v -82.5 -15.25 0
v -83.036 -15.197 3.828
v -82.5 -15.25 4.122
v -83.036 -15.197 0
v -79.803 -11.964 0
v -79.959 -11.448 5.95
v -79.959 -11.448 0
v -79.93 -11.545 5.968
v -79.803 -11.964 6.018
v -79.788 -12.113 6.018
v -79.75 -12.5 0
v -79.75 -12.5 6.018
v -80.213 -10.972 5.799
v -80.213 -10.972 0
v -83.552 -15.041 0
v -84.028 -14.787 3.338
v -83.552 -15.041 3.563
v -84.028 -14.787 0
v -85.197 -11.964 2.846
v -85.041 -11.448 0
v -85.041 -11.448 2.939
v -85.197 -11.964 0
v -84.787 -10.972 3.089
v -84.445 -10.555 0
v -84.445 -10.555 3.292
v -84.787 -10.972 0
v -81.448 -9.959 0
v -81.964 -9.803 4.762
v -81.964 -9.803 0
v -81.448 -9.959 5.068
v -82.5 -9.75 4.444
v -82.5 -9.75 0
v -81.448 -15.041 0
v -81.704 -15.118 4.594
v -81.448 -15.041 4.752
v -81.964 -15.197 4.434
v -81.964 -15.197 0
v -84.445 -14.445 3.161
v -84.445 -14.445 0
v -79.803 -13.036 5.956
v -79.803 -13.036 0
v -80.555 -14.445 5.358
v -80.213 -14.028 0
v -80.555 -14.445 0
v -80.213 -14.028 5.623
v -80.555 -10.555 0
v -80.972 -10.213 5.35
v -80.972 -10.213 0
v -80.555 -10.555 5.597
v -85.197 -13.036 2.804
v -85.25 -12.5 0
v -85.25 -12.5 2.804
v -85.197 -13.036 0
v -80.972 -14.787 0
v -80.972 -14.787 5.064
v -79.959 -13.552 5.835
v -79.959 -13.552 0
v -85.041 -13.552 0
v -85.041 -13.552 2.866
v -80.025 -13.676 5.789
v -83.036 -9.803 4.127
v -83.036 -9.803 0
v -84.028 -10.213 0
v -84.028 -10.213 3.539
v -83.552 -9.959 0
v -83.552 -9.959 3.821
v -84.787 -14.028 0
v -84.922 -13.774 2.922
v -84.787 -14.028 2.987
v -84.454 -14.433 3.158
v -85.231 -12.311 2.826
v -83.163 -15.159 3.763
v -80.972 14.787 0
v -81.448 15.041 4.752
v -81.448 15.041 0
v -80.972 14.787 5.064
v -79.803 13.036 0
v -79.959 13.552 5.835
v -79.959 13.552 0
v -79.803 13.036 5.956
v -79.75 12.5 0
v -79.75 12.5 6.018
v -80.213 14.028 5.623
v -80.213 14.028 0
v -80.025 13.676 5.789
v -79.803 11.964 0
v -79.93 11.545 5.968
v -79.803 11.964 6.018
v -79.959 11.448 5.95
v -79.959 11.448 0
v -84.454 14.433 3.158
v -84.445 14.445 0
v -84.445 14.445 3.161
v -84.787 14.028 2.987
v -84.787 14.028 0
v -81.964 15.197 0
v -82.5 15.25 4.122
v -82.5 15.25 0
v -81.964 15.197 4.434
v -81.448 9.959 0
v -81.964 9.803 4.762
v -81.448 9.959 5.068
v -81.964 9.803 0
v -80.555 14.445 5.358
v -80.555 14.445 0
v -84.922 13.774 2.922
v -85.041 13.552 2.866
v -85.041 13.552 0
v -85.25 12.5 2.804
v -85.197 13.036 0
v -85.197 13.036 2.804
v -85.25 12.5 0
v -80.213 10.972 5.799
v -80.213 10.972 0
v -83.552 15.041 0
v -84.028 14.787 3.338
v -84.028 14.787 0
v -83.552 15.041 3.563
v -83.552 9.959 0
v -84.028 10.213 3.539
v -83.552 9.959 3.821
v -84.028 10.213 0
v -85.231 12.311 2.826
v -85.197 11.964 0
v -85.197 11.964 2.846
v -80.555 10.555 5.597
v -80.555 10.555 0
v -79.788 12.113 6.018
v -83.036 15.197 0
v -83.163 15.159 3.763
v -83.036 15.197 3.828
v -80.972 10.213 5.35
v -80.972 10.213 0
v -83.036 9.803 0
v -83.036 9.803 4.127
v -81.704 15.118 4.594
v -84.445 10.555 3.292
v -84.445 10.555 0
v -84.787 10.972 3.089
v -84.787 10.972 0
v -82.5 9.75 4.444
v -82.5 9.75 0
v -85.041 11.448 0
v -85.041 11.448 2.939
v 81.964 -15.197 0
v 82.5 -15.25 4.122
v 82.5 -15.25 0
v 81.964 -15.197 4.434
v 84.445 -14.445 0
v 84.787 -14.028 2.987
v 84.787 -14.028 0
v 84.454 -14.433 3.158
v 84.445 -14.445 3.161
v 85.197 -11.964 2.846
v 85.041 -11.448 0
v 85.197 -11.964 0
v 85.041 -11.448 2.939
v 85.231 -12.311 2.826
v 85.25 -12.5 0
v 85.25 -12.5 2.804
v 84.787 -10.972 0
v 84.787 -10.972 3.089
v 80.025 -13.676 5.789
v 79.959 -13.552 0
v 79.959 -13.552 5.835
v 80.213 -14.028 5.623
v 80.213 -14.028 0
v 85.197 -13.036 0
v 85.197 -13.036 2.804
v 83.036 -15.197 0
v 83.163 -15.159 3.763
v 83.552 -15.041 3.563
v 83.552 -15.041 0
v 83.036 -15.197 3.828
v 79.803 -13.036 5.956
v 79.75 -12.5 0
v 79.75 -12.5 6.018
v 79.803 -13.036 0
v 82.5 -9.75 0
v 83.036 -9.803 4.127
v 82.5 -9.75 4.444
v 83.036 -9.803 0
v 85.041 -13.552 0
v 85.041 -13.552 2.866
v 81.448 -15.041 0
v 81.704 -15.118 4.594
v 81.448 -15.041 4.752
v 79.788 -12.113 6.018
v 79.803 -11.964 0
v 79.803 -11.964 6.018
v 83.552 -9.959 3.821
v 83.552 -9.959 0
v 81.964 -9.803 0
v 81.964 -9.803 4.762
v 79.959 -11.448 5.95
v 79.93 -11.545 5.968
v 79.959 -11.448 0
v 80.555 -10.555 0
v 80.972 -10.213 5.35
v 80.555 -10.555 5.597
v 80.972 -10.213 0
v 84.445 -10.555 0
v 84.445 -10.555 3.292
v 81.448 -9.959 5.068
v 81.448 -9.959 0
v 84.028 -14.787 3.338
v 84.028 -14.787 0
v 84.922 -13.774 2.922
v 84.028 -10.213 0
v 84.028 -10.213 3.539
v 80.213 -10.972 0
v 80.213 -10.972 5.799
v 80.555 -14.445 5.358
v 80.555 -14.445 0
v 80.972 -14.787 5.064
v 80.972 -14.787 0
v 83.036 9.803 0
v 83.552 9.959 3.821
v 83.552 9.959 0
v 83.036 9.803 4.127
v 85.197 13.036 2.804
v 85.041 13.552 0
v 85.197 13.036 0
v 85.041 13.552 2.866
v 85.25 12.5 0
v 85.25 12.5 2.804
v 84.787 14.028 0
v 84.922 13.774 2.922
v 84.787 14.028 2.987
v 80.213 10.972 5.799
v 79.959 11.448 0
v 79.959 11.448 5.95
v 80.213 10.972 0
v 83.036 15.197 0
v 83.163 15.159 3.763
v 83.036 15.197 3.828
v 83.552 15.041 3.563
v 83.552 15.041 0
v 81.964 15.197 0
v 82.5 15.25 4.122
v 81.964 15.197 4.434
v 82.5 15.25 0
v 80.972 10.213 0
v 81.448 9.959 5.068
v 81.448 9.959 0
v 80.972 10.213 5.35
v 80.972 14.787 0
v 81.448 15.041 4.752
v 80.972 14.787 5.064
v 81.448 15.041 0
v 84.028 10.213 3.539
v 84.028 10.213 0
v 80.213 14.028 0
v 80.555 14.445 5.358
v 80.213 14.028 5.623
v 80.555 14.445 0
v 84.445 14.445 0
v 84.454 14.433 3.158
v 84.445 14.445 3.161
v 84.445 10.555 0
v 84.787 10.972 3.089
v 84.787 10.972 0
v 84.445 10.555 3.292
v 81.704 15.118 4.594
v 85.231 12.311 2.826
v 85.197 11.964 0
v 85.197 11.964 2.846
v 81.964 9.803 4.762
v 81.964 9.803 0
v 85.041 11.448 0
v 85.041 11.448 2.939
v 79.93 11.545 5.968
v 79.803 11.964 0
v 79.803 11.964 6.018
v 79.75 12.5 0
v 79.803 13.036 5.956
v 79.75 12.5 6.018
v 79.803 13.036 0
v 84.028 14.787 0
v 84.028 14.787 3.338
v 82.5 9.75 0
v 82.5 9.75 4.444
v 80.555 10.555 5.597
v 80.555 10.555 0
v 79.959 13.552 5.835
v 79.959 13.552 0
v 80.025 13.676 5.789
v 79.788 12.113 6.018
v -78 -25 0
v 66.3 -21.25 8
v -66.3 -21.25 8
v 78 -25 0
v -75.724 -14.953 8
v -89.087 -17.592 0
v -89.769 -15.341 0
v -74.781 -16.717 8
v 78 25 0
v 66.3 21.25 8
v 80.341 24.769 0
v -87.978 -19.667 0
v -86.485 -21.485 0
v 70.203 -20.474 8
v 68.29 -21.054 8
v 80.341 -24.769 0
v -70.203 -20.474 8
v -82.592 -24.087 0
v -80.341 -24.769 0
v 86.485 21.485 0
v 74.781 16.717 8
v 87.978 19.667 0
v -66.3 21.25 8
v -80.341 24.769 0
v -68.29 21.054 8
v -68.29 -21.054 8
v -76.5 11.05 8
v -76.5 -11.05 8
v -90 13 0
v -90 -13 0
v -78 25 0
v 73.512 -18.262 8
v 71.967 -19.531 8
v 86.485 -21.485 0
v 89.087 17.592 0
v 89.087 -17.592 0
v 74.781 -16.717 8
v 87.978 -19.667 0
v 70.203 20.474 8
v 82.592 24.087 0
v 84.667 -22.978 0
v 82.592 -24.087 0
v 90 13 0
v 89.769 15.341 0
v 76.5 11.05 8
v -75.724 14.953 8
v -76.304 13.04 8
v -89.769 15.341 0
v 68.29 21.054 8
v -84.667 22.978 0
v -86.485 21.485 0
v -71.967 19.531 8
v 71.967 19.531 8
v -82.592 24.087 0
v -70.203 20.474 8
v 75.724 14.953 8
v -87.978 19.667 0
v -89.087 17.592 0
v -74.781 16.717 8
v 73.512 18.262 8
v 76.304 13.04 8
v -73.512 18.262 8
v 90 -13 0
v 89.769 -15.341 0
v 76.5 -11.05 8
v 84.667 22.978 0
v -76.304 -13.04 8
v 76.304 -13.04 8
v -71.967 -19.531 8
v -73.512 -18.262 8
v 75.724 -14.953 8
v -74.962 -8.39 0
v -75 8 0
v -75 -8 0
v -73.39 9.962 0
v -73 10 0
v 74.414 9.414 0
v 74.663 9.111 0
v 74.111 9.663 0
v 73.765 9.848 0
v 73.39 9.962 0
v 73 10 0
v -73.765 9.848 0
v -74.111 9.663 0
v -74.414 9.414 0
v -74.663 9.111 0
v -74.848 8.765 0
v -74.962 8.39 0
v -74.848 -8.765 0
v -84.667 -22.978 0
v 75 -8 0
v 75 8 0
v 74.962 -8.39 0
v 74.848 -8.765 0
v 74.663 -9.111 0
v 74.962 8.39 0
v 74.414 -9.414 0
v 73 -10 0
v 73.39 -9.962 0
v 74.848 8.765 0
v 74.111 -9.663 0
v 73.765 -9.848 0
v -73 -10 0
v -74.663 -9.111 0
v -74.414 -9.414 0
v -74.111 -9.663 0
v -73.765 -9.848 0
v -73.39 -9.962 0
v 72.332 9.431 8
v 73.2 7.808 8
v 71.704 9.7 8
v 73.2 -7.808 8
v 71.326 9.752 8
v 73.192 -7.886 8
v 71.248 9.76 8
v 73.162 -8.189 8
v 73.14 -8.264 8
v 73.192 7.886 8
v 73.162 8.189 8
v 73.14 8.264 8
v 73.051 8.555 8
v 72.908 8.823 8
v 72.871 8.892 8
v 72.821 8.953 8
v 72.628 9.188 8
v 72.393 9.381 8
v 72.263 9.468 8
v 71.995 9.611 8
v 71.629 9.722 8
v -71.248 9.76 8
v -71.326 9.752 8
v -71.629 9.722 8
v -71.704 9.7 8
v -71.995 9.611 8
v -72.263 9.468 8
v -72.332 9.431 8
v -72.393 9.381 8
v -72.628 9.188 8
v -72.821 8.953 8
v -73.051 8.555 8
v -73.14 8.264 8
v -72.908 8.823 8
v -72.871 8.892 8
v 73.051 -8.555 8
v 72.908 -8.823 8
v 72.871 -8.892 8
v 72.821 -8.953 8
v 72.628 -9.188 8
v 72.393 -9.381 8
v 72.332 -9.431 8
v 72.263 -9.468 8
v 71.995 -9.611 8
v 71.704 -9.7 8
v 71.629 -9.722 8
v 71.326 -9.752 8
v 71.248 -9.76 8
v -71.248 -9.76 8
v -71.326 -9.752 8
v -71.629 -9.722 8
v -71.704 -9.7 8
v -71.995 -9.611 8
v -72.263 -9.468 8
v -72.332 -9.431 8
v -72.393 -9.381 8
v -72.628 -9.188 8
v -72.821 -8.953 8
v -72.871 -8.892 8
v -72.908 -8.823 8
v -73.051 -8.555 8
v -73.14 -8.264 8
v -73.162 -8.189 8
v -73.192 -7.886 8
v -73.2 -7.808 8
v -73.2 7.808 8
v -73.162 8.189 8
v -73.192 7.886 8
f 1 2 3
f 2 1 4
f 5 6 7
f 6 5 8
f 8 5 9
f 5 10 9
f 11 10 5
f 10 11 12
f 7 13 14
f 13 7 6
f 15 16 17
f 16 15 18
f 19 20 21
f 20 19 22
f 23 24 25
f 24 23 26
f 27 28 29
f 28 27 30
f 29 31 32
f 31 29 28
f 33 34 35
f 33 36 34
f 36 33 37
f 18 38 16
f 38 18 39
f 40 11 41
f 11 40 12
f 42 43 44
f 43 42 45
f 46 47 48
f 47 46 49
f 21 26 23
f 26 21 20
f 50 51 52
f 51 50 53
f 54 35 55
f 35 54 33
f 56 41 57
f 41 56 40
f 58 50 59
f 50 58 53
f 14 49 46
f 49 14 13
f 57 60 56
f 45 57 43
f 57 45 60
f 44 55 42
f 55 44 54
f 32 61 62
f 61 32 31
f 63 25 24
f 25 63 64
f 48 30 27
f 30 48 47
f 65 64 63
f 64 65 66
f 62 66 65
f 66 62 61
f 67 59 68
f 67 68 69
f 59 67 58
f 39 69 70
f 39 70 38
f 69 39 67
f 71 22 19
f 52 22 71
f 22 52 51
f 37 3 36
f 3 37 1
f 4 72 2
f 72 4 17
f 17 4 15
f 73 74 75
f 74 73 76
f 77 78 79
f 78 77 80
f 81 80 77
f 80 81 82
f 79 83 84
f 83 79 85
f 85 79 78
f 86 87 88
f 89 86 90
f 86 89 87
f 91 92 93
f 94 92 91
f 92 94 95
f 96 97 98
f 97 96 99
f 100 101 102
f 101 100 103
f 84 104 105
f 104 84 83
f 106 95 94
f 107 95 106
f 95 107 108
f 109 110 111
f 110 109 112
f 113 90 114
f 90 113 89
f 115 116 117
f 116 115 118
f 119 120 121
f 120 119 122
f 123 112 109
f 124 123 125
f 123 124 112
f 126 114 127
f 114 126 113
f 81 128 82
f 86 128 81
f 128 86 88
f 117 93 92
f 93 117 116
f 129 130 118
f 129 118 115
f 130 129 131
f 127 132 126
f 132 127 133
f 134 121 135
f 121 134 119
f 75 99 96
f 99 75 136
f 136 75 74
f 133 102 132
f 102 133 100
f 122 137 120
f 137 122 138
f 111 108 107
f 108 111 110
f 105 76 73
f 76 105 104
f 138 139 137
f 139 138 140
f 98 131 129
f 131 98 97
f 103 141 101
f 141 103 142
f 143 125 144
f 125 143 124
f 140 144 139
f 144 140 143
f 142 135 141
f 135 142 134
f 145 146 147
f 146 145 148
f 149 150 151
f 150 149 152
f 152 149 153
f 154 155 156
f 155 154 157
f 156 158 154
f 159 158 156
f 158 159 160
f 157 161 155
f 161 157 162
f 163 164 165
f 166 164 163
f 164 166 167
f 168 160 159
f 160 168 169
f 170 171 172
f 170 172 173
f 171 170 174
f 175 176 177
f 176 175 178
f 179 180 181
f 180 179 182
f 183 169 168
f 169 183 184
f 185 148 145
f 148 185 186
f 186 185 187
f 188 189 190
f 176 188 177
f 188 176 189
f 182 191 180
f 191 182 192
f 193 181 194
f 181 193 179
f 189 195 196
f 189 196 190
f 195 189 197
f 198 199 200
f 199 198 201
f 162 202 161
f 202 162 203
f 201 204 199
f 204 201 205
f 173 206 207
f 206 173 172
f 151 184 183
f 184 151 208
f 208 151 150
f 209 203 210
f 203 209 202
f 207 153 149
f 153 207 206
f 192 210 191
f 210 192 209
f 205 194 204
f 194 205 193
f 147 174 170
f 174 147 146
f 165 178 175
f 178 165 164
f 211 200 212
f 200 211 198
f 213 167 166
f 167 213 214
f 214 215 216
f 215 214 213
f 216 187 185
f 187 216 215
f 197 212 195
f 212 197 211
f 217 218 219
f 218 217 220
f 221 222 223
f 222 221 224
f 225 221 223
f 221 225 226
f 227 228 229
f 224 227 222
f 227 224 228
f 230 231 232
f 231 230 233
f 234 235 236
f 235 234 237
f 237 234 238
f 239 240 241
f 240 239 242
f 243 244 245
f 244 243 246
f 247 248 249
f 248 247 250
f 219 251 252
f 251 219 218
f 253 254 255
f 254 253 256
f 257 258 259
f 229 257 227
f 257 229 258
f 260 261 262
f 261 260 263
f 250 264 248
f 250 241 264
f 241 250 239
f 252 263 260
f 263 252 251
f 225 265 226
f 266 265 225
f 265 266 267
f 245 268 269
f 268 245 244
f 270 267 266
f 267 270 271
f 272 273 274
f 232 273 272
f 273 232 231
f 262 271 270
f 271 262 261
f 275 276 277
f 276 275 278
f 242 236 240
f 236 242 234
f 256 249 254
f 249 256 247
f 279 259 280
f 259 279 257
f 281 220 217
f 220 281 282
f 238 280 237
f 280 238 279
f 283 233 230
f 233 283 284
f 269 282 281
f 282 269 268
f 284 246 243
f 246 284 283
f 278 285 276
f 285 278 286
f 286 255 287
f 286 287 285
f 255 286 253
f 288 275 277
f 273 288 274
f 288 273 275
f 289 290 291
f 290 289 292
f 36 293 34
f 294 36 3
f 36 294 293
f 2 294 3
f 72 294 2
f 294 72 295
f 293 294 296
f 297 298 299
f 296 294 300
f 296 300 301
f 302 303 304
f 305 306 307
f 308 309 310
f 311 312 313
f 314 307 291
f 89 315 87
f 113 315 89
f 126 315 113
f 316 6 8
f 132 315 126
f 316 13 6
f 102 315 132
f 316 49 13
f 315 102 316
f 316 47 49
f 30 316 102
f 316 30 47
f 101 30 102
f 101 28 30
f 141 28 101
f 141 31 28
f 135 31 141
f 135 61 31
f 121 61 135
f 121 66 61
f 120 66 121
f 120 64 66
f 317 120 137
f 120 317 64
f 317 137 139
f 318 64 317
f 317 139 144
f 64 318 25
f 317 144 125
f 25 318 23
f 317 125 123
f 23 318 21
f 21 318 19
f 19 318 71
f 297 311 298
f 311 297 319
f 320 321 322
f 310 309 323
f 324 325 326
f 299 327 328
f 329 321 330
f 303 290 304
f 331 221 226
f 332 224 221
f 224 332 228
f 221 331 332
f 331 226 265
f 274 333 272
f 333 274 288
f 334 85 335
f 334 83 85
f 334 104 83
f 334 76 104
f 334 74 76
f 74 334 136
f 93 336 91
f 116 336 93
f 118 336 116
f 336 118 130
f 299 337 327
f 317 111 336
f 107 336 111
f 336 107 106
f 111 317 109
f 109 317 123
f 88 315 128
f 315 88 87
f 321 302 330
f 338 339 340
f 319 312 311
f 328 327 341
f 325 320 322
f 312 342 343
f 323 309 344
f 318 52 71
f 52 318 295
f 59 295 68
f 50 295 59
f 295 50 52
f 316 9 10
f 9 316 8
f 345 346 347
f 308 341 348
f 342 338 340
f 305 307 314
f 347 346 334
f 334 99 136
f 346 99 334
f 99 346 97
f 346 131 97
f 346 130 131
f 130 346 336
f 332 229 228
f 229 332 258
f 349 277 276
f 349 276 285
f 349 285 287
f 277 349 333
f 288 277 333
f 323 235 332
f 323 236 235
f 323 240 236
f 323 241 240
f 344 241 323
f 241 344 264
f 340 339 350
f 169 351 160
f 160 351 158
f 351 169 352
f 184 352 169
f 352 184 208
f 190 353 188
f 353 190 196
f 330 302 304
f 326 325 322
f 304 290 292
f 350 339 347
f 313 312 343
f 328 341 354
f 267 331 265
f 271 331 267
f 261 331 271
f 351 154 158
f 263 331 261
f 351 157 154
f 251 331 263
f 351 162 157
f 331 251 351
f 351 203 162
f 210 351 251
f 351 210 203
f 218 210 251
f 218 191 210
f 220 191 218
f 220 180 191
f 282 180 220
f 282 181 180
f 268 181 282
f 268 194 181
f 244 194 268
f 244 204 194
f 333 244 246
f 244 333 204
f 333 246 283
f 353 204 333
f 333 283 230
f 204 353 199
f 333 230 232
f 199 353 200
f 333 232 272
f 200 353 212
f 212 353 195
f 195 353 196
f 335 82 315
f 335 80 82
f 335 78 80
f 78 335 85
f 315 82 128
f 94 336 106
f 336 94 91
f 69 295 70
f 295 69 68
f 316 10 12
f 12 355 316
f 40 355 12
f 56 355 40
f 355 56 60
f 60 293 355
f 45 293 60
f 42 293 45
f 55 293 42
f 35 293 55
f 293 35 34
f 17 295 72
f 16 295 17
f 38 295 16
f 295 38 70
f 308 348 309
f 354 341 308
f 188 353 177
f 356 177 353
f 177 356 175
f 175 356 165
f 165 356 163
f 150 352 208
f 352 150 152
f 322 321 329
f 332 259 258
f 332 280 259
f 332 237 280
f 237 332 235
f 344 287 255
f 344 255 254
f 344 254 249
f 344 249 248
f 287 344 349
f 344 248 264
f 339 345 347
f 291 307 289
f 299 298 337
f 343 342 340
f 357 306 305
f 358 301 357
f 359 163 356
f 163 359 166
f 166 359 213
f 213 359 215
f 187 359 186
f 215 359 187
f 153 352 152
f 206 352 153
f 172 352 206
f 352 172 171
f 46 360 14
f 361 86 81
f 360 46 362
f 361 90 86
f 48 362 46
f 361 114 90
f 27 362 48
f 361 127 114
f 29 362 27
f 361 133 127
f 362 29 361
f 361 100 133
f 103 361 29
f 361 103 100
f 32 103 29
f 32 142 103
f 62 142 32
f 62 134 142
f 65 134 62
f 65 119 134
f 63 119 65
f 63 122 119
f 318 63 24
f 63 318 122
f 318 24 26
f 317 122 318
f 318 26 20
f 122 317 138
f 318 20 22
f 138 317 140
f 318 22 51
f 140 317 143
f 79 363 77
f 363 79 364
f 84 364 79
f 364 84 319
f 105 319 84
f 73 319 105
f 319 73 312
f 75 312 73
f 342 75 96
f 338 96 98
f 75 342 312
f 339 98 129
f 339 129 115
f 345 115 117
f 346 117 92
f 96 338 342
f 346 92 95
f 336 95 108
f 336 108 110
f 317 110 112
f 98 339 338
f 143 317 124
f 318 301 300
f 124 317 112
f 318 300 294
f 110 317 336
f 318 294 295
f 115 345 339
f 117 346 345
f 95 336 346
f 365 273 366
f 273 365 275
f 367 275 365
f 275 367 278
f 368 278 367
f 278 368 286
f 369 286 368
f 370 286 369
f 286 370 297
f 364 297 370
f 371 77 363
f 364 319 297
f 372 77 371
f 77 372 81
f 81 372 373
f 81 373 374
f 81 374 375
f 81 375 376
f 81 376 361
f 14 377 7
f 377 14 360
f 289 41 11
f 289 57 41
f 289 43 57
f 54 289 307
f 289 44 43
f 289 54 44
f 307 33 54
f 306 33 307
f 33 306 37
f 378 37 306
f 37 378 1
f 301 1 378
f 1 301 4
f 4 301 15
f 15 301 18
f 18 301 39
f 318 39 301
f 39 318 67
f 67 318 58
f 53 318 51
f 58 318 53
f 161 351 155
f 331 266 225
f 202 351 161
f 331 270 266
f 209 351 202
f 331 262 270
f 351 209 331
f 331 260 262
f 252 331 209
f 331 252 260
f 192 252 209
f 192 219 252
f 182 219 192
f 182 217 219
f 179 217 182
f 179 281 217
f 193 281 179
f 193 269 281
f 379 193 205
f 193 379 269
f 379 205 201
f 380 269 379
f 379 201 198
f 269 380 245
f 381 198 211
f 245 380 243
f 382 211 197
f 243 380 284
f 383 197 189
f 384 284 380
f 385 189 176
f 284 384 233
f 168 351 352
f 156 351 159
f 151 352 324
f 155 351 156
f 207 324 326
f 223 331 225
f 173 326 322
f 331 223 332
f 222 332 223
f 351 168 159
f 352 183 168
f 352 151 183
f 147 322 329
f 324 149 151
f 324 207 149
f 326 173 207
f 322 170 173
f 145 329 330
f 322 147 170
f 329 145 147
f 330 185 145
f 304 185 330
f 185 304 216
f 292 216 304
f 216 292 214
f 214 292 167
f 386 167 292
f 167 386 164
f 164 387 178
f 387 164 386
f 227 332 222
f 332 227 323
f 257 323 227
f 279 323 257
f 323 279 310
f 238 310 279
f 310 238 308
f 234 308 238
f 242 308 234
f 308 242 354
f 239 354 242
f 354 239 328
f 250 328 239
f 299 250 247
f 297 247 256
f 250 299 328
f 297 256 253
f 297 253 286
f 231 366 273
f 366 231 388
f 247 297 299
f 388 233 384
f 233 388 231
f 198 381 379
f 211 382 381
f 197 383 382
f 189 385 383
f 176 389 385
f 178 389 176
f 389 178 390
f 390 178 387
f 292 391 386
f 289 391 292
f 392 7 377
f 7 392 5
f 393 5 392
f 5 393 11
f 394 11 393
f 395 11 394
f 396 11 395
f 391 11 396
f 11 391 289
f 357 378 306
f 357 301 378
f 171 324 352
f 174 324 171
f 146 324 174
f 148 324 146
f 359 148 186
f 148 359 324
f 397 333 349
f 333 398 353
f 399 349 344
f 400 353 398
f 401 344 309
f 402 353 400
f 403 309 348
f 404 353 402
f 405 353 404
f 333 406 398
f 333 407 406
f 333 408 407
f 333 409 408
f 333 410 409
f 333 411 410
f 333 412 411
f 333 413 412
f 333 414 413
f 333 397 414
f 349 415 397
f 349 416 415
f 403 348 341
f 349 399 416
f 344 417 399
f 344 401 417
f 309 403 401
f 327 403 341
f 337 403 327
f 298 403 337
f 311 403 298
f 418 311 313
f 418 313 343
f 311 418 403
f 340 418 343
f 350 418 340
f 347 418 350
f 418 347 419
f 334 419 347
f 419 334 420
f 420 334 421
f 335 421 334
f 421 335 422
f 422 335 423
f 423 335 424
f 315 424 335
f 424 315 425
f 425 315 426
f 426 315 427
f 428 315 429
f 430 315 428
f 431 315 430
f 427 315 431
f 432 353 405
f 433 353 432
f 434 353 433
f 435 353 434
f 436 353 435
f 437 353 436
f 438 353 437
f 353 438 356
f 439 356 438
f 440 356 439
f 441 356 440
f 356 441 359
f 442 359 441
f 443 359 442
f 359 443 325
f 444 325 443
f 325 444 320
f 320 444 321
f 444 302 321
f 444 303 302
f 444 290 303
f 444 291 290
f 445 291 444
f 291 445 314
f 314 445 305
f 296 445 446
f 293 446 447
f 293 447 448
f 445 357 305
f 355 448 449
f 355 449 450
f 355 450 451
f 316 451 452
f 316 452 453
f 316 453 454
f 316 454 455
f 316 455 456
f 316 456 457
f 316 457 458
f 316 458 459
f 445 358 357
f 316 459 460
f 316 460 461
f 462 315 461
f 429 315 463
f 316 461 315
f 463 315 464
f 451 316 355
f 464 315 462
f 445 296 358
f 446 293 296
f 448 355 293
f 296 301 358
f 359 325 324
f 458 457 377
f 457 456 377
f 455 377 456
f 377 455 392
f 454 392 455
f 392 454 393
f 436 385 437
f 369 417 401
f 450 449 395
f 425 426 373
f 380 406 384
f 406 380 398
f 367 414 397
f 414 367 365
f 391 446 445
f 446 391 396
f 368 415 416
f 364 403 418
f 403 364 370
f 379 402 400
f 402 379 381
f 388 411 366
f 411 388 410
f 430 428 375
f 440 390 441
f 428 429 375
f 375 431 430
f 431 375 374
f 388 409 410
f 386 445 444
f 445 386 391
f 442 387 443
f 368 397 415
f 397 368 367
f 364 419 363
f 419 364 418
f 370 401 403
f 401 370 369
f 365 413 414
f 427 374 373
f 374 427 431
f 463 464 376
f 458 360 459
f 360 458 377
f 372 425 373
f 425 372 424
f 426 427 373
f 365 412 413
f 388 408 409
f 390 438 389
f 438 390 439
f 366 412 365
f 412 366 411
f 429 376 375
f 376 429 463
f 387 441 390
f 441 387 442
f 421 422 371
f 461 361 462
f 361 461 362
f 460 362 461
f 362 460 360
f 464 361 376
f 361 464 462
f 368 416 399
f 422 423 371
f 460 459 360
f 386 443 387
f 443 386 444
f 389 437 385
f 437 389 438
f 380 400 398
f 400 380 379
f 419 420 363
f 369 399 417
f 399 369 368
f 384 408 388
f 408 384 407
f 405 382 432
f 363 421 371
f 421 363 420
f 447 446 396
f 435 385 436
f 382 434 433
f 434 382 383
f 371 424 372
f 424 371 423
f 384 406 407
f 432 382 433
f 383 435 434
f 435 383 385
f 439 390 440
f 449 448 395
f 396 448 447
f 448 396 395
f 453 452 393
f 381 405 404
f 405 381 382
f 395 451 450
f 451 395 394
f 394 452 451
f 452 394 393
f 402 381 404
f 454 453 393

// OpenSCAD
$fn = 32;

// ----------------------------------------------------------------------
// Display bezel: 180 x 50 mm frame, opening 150x20 mm
// ----------------------------------------------------------------------

// --- parameters (mm) ---
length = 180;             // frame outside length, X
width = 50;               // frame outside width, Y
frame_w = 15;             // frame width
thickness = 8;            // frame thickness
corner_r = 12;            // outside corner radius
chamfer = 0.85;           // outer wall taper
funnel = 0.97;            // inner opening taper
opening_l = 150;          // opening length
opening_w = 20;           // opening width
inner_r = 2;              // opening corner radius
hole_d = 5.5;             // mounting screw clearance
holes_per_side = 2;       // holes per short side
hole_inset = 7.5;         // hole centre inset from the outside edge

/* rounded-rectangle outlines, generated with loops */
module rounded_ring(l_nom, w_nom, r) {
  hull() {
    for (sx = [-1, 1]) for (sy = [-1, 1])
      translate([sx * (l_nom / 2 - r), sy * (w_nom / 2 - r)]) circle(r = r);
  }
}

difference() {
  /* frame body, drafted so the outer edge is a variable-depth chamfer */
  linear_extrude(height = thickness, scale = chamfer)
    rounded_ring(length, width, corner_r);
  /* viewing opening, drafted the other way for a funnel edge */
  linear_extrude(height = thickness + 2, scale = funnel)
    translate([0, 0, -1]) rounded_ring(opening_l, opening_w, inner_r);
  /* mounting screws through the frame lands */
  for (sx = [-1, 1]) for (i = [1 : holes_per_side])
    translate([sx * (length / 2 - hole_inset),
               (i - (holes_per_side + 1) / 2) * width * 0.5, -1])
      cylinder(h = thickness + 2, d = hole_d);
}
